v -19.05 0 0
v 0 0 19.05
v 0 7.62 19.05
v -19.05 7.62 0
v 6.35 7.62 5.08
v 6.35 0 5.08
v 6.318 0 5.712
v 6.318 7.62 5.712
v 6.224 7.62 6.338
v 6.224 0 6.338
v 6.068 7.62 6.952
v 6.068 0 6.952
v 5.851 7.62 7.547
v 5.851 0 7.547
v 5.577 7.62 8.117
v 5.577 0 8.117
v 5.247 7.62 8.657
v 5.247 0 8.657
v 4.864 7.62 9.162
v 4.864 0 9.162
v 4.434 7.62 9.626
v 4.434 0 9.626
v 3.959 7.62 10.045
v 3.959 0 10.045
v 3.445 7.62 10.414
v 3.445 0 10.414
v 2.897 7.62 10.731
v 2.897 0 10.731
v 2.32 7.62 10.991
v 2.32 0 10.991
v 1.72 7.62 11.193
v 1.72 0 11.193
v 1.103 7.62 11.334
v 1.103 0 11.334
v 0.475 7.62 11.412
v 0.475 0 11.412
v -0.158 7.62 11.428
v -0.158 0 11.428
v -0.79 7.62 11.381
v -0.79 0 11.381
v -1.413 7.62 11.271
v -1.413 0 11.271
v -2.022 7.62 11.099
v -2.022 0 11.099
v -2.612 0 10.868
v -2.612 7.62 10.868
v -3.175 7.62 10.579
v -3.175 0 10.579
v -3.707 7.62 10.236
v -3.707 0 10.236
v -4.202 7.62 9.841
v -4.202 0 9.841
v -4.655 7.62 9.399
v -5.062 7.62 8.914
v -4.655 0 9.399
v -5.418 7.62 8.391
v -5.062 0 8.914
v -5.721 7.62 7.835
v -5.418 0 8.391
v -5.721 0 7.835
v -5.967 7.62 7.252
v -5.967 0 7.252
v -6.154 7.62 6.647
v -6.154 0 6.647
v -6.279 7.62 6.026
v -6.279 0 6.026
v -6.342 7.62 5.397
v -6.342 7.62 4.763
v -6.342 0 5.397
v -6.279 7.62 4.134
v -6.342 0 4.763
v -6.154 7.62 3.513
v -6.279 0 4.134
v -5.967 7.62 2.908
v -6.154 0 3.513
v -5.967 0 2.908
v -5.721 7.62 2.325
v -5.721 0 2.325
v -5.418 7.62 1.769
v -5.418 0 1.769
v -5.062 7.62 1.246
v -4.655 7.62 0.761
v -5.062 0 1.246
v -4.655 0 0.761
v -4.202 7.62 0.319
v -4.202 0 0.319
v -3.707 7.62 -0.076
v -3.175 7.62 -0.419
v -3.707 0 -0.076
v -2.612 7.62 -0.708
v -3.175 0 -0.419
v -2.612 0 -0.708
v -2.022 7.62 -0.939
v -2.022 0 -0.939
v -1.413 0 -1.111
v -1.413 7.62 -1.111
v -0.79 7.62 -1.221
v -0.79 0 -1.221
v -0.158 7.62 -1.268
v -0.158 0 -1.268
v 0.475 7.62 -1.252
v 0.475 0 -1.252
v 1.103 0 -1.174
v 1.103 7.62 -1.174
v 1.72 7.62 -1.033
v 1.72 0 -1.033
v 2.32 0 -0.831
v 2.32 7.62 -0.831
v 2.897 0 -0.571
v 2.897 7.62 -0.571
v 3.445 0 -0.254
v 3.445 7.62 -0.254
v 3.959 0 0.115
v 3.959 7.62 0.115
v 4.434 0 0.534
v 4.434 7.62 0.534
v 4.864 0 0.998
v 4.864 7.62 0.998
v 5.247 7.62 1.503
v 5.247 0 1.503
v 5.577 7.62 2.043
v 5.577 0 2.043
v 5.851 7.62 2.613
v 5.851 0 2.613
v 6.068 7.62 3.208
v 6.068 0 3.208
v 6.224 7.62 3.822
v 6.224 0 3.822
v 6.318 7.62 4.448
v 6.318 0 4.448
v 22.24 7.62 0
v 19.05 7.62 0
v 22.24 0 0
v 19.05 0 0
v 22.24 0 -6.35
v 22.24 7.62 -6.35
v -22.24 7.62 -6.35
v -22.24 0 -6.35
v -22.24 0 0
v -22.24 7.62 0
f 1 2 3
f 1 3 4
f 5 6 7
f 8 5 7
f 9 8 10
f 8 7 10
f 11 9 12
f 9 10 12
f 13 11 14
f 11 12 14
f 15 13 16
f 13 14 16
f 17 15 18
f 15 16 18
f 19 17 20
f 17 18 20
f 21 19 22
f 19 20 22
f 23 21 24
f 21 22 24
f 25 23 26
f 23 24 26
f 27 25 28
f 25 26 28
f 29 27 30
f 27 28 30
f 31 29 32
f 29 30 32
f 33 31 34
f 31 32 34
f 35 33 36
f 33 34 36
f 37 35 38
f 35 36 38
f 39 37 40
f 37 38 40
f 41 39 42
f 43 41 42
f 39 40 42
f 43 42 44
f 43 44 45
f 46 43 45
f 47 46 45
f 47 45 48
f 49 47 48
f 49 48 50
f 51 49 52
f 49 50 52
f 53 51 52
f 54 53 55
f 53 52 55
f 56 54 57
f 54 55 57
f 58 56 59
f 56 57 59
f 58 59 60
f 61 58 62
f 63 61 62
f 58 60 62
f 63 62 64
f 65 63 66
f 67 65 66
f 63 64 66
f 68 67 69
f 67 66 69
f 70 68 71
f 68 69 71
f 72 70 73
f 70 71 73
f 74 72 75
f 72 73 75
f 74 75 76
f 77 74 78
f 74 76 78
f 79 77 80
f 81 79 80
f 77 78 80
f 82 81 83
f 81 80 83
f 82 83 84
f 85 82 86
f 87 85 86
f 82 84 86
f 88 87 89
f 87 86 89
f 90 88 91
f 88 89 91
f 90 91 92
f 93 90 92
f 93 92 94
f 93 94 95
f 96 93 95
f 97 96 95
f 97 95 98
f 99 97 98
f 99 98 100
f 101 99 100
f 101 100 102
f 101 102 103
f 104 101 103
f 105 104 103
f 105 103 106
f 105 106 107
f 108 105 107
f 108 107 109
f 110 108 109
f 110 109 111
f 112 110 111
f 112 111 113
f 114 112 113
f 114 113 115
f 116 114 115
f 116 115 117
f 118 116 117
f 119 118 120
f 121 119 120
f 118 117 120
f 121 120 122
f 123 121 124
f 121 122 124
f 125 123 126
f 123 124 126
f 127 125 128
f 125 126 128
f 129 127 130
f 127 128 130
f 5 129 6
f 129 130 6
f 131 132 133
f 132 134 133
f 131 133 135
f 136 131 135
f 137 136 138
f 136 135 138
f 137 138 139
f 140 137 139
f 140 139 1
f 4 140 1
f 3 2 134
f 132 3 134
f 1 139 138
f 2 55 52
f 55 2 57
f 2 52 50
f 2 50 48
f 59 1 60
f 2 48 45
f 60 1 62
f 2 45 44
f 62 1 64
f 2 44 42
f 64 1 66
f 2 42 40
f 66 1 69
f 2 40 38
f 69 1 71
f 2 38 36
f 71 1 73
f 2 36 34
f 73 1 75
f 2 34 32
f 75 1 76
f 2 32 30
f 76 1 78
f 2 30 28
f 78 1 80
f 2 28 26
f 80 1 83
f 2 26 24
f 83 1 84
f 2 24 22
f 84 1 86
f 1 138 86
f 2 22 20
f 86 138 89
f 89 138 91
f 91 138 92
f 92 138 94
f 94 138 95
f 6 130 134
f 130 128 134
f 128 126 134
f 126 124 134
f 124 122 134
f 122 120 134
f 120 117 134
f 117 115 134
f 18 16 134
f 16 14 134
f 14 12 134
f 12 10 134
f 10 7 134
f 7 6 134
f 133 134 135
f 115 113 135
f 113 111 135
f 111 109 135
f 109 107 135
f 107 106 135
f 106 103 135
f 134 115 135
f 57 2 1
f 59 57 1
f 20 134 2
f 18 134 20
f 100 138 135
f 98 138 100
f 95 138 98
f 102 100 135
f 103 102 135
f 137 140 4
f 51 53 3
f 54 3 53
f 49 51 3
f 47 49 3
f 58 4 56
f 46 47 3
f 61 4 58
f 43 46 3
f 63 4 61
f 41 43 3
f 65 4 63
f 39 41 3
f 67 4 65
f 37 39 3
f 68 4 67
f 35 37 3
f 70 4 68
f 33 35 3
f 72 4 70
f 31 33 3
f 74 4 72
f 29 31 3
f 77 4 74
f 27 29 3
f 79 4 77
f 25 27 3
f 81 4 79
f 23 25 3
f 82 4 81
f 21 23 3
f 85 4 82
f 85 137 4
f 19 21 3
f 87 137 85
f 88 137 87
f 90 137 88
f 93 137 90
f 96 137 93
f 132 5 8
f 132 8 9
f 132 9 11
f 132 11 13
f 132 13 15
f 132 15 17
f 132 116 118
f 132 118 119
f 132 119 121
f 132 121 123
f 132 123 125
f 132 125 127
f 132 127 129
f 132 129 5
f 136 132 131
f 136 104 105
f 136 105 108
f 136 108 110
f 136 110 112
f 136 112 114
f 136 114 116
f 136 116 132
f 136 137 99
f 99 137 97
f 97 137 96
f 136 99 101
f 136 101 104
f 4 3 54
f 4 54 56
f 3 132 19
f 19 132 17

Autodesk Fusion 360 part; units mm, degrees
sketch "Sketch1" plane through (0, 0, 0) normal (0, 1, 0) x (1, 0, 0)
  line L0 (-22.2401, 0) -> (22.2401, 0)
  line L1 (22.2401, 0) -> (22.2401, 6.35)
  line L2 (22.2401, 6.35) -> (-22.2401, 6.35)
  line L3 (-22.2401, 6.35) -> (-22.2401, 0)
  line L4 (0, 0) -> (0, -19.05)
  line L5 (0, -19.05) -> (-19.05, 0)
  line L6 (0, -19.05) -> (-21.997, -19.05) construction
  line L7 (0, -19.05) -> (19.05, 0)
  dimension "d1" = 19.05
  dimension "d2" = 45
  dimension "d6" = 25.4
extrude "Extrude1" add sketch "Sketch1" along normal blind 7.62
sketch "Sketch2" plane through (0, 0, 0) normal (0, -1, 0) x (1, 0, 0)
  line L0 (19.05, 0) -> (0, 19.05)
  line L1 (0, 19.05) -> (-19.05, 0)
  line L2 (-19.05, 0) -> (-22.2401, 0)
  line L3 (-22.2401, 0) -> (-22.2401, -6.35)
  line L4 (-22.2401, -6.35) -> (22.2401, -6.35)
  line L5 (22.2401, -6.35) -> (22.2401, 0)
  line L6 (22.2401, 0) -> (19.05, 0)
  line L7 (0, -6.35) -> (0, 20.8829)
  circle A0 centre (0, 5.08) radius 6.35
  dimension "d12" = 12.7
extrude "Extrude2" cut sketch "Sketch2" against normal blind 54.61 contours L7 A0 | L7 A0
equation "d1 = triangleHeight"
equation "d2 = triangleDeg"
equation "length = 1 in"
equation "height = 1 in"
equation "triangleHeight = 0.75 in"
equation "d6 = height"
equation "triangleDeg = 45 deg"
equation "width = 0.3 in"
equation "d9 = width"
equation "AxleHoleDia = 0.5 in"
equation "d12 = AxleHoleDia"
